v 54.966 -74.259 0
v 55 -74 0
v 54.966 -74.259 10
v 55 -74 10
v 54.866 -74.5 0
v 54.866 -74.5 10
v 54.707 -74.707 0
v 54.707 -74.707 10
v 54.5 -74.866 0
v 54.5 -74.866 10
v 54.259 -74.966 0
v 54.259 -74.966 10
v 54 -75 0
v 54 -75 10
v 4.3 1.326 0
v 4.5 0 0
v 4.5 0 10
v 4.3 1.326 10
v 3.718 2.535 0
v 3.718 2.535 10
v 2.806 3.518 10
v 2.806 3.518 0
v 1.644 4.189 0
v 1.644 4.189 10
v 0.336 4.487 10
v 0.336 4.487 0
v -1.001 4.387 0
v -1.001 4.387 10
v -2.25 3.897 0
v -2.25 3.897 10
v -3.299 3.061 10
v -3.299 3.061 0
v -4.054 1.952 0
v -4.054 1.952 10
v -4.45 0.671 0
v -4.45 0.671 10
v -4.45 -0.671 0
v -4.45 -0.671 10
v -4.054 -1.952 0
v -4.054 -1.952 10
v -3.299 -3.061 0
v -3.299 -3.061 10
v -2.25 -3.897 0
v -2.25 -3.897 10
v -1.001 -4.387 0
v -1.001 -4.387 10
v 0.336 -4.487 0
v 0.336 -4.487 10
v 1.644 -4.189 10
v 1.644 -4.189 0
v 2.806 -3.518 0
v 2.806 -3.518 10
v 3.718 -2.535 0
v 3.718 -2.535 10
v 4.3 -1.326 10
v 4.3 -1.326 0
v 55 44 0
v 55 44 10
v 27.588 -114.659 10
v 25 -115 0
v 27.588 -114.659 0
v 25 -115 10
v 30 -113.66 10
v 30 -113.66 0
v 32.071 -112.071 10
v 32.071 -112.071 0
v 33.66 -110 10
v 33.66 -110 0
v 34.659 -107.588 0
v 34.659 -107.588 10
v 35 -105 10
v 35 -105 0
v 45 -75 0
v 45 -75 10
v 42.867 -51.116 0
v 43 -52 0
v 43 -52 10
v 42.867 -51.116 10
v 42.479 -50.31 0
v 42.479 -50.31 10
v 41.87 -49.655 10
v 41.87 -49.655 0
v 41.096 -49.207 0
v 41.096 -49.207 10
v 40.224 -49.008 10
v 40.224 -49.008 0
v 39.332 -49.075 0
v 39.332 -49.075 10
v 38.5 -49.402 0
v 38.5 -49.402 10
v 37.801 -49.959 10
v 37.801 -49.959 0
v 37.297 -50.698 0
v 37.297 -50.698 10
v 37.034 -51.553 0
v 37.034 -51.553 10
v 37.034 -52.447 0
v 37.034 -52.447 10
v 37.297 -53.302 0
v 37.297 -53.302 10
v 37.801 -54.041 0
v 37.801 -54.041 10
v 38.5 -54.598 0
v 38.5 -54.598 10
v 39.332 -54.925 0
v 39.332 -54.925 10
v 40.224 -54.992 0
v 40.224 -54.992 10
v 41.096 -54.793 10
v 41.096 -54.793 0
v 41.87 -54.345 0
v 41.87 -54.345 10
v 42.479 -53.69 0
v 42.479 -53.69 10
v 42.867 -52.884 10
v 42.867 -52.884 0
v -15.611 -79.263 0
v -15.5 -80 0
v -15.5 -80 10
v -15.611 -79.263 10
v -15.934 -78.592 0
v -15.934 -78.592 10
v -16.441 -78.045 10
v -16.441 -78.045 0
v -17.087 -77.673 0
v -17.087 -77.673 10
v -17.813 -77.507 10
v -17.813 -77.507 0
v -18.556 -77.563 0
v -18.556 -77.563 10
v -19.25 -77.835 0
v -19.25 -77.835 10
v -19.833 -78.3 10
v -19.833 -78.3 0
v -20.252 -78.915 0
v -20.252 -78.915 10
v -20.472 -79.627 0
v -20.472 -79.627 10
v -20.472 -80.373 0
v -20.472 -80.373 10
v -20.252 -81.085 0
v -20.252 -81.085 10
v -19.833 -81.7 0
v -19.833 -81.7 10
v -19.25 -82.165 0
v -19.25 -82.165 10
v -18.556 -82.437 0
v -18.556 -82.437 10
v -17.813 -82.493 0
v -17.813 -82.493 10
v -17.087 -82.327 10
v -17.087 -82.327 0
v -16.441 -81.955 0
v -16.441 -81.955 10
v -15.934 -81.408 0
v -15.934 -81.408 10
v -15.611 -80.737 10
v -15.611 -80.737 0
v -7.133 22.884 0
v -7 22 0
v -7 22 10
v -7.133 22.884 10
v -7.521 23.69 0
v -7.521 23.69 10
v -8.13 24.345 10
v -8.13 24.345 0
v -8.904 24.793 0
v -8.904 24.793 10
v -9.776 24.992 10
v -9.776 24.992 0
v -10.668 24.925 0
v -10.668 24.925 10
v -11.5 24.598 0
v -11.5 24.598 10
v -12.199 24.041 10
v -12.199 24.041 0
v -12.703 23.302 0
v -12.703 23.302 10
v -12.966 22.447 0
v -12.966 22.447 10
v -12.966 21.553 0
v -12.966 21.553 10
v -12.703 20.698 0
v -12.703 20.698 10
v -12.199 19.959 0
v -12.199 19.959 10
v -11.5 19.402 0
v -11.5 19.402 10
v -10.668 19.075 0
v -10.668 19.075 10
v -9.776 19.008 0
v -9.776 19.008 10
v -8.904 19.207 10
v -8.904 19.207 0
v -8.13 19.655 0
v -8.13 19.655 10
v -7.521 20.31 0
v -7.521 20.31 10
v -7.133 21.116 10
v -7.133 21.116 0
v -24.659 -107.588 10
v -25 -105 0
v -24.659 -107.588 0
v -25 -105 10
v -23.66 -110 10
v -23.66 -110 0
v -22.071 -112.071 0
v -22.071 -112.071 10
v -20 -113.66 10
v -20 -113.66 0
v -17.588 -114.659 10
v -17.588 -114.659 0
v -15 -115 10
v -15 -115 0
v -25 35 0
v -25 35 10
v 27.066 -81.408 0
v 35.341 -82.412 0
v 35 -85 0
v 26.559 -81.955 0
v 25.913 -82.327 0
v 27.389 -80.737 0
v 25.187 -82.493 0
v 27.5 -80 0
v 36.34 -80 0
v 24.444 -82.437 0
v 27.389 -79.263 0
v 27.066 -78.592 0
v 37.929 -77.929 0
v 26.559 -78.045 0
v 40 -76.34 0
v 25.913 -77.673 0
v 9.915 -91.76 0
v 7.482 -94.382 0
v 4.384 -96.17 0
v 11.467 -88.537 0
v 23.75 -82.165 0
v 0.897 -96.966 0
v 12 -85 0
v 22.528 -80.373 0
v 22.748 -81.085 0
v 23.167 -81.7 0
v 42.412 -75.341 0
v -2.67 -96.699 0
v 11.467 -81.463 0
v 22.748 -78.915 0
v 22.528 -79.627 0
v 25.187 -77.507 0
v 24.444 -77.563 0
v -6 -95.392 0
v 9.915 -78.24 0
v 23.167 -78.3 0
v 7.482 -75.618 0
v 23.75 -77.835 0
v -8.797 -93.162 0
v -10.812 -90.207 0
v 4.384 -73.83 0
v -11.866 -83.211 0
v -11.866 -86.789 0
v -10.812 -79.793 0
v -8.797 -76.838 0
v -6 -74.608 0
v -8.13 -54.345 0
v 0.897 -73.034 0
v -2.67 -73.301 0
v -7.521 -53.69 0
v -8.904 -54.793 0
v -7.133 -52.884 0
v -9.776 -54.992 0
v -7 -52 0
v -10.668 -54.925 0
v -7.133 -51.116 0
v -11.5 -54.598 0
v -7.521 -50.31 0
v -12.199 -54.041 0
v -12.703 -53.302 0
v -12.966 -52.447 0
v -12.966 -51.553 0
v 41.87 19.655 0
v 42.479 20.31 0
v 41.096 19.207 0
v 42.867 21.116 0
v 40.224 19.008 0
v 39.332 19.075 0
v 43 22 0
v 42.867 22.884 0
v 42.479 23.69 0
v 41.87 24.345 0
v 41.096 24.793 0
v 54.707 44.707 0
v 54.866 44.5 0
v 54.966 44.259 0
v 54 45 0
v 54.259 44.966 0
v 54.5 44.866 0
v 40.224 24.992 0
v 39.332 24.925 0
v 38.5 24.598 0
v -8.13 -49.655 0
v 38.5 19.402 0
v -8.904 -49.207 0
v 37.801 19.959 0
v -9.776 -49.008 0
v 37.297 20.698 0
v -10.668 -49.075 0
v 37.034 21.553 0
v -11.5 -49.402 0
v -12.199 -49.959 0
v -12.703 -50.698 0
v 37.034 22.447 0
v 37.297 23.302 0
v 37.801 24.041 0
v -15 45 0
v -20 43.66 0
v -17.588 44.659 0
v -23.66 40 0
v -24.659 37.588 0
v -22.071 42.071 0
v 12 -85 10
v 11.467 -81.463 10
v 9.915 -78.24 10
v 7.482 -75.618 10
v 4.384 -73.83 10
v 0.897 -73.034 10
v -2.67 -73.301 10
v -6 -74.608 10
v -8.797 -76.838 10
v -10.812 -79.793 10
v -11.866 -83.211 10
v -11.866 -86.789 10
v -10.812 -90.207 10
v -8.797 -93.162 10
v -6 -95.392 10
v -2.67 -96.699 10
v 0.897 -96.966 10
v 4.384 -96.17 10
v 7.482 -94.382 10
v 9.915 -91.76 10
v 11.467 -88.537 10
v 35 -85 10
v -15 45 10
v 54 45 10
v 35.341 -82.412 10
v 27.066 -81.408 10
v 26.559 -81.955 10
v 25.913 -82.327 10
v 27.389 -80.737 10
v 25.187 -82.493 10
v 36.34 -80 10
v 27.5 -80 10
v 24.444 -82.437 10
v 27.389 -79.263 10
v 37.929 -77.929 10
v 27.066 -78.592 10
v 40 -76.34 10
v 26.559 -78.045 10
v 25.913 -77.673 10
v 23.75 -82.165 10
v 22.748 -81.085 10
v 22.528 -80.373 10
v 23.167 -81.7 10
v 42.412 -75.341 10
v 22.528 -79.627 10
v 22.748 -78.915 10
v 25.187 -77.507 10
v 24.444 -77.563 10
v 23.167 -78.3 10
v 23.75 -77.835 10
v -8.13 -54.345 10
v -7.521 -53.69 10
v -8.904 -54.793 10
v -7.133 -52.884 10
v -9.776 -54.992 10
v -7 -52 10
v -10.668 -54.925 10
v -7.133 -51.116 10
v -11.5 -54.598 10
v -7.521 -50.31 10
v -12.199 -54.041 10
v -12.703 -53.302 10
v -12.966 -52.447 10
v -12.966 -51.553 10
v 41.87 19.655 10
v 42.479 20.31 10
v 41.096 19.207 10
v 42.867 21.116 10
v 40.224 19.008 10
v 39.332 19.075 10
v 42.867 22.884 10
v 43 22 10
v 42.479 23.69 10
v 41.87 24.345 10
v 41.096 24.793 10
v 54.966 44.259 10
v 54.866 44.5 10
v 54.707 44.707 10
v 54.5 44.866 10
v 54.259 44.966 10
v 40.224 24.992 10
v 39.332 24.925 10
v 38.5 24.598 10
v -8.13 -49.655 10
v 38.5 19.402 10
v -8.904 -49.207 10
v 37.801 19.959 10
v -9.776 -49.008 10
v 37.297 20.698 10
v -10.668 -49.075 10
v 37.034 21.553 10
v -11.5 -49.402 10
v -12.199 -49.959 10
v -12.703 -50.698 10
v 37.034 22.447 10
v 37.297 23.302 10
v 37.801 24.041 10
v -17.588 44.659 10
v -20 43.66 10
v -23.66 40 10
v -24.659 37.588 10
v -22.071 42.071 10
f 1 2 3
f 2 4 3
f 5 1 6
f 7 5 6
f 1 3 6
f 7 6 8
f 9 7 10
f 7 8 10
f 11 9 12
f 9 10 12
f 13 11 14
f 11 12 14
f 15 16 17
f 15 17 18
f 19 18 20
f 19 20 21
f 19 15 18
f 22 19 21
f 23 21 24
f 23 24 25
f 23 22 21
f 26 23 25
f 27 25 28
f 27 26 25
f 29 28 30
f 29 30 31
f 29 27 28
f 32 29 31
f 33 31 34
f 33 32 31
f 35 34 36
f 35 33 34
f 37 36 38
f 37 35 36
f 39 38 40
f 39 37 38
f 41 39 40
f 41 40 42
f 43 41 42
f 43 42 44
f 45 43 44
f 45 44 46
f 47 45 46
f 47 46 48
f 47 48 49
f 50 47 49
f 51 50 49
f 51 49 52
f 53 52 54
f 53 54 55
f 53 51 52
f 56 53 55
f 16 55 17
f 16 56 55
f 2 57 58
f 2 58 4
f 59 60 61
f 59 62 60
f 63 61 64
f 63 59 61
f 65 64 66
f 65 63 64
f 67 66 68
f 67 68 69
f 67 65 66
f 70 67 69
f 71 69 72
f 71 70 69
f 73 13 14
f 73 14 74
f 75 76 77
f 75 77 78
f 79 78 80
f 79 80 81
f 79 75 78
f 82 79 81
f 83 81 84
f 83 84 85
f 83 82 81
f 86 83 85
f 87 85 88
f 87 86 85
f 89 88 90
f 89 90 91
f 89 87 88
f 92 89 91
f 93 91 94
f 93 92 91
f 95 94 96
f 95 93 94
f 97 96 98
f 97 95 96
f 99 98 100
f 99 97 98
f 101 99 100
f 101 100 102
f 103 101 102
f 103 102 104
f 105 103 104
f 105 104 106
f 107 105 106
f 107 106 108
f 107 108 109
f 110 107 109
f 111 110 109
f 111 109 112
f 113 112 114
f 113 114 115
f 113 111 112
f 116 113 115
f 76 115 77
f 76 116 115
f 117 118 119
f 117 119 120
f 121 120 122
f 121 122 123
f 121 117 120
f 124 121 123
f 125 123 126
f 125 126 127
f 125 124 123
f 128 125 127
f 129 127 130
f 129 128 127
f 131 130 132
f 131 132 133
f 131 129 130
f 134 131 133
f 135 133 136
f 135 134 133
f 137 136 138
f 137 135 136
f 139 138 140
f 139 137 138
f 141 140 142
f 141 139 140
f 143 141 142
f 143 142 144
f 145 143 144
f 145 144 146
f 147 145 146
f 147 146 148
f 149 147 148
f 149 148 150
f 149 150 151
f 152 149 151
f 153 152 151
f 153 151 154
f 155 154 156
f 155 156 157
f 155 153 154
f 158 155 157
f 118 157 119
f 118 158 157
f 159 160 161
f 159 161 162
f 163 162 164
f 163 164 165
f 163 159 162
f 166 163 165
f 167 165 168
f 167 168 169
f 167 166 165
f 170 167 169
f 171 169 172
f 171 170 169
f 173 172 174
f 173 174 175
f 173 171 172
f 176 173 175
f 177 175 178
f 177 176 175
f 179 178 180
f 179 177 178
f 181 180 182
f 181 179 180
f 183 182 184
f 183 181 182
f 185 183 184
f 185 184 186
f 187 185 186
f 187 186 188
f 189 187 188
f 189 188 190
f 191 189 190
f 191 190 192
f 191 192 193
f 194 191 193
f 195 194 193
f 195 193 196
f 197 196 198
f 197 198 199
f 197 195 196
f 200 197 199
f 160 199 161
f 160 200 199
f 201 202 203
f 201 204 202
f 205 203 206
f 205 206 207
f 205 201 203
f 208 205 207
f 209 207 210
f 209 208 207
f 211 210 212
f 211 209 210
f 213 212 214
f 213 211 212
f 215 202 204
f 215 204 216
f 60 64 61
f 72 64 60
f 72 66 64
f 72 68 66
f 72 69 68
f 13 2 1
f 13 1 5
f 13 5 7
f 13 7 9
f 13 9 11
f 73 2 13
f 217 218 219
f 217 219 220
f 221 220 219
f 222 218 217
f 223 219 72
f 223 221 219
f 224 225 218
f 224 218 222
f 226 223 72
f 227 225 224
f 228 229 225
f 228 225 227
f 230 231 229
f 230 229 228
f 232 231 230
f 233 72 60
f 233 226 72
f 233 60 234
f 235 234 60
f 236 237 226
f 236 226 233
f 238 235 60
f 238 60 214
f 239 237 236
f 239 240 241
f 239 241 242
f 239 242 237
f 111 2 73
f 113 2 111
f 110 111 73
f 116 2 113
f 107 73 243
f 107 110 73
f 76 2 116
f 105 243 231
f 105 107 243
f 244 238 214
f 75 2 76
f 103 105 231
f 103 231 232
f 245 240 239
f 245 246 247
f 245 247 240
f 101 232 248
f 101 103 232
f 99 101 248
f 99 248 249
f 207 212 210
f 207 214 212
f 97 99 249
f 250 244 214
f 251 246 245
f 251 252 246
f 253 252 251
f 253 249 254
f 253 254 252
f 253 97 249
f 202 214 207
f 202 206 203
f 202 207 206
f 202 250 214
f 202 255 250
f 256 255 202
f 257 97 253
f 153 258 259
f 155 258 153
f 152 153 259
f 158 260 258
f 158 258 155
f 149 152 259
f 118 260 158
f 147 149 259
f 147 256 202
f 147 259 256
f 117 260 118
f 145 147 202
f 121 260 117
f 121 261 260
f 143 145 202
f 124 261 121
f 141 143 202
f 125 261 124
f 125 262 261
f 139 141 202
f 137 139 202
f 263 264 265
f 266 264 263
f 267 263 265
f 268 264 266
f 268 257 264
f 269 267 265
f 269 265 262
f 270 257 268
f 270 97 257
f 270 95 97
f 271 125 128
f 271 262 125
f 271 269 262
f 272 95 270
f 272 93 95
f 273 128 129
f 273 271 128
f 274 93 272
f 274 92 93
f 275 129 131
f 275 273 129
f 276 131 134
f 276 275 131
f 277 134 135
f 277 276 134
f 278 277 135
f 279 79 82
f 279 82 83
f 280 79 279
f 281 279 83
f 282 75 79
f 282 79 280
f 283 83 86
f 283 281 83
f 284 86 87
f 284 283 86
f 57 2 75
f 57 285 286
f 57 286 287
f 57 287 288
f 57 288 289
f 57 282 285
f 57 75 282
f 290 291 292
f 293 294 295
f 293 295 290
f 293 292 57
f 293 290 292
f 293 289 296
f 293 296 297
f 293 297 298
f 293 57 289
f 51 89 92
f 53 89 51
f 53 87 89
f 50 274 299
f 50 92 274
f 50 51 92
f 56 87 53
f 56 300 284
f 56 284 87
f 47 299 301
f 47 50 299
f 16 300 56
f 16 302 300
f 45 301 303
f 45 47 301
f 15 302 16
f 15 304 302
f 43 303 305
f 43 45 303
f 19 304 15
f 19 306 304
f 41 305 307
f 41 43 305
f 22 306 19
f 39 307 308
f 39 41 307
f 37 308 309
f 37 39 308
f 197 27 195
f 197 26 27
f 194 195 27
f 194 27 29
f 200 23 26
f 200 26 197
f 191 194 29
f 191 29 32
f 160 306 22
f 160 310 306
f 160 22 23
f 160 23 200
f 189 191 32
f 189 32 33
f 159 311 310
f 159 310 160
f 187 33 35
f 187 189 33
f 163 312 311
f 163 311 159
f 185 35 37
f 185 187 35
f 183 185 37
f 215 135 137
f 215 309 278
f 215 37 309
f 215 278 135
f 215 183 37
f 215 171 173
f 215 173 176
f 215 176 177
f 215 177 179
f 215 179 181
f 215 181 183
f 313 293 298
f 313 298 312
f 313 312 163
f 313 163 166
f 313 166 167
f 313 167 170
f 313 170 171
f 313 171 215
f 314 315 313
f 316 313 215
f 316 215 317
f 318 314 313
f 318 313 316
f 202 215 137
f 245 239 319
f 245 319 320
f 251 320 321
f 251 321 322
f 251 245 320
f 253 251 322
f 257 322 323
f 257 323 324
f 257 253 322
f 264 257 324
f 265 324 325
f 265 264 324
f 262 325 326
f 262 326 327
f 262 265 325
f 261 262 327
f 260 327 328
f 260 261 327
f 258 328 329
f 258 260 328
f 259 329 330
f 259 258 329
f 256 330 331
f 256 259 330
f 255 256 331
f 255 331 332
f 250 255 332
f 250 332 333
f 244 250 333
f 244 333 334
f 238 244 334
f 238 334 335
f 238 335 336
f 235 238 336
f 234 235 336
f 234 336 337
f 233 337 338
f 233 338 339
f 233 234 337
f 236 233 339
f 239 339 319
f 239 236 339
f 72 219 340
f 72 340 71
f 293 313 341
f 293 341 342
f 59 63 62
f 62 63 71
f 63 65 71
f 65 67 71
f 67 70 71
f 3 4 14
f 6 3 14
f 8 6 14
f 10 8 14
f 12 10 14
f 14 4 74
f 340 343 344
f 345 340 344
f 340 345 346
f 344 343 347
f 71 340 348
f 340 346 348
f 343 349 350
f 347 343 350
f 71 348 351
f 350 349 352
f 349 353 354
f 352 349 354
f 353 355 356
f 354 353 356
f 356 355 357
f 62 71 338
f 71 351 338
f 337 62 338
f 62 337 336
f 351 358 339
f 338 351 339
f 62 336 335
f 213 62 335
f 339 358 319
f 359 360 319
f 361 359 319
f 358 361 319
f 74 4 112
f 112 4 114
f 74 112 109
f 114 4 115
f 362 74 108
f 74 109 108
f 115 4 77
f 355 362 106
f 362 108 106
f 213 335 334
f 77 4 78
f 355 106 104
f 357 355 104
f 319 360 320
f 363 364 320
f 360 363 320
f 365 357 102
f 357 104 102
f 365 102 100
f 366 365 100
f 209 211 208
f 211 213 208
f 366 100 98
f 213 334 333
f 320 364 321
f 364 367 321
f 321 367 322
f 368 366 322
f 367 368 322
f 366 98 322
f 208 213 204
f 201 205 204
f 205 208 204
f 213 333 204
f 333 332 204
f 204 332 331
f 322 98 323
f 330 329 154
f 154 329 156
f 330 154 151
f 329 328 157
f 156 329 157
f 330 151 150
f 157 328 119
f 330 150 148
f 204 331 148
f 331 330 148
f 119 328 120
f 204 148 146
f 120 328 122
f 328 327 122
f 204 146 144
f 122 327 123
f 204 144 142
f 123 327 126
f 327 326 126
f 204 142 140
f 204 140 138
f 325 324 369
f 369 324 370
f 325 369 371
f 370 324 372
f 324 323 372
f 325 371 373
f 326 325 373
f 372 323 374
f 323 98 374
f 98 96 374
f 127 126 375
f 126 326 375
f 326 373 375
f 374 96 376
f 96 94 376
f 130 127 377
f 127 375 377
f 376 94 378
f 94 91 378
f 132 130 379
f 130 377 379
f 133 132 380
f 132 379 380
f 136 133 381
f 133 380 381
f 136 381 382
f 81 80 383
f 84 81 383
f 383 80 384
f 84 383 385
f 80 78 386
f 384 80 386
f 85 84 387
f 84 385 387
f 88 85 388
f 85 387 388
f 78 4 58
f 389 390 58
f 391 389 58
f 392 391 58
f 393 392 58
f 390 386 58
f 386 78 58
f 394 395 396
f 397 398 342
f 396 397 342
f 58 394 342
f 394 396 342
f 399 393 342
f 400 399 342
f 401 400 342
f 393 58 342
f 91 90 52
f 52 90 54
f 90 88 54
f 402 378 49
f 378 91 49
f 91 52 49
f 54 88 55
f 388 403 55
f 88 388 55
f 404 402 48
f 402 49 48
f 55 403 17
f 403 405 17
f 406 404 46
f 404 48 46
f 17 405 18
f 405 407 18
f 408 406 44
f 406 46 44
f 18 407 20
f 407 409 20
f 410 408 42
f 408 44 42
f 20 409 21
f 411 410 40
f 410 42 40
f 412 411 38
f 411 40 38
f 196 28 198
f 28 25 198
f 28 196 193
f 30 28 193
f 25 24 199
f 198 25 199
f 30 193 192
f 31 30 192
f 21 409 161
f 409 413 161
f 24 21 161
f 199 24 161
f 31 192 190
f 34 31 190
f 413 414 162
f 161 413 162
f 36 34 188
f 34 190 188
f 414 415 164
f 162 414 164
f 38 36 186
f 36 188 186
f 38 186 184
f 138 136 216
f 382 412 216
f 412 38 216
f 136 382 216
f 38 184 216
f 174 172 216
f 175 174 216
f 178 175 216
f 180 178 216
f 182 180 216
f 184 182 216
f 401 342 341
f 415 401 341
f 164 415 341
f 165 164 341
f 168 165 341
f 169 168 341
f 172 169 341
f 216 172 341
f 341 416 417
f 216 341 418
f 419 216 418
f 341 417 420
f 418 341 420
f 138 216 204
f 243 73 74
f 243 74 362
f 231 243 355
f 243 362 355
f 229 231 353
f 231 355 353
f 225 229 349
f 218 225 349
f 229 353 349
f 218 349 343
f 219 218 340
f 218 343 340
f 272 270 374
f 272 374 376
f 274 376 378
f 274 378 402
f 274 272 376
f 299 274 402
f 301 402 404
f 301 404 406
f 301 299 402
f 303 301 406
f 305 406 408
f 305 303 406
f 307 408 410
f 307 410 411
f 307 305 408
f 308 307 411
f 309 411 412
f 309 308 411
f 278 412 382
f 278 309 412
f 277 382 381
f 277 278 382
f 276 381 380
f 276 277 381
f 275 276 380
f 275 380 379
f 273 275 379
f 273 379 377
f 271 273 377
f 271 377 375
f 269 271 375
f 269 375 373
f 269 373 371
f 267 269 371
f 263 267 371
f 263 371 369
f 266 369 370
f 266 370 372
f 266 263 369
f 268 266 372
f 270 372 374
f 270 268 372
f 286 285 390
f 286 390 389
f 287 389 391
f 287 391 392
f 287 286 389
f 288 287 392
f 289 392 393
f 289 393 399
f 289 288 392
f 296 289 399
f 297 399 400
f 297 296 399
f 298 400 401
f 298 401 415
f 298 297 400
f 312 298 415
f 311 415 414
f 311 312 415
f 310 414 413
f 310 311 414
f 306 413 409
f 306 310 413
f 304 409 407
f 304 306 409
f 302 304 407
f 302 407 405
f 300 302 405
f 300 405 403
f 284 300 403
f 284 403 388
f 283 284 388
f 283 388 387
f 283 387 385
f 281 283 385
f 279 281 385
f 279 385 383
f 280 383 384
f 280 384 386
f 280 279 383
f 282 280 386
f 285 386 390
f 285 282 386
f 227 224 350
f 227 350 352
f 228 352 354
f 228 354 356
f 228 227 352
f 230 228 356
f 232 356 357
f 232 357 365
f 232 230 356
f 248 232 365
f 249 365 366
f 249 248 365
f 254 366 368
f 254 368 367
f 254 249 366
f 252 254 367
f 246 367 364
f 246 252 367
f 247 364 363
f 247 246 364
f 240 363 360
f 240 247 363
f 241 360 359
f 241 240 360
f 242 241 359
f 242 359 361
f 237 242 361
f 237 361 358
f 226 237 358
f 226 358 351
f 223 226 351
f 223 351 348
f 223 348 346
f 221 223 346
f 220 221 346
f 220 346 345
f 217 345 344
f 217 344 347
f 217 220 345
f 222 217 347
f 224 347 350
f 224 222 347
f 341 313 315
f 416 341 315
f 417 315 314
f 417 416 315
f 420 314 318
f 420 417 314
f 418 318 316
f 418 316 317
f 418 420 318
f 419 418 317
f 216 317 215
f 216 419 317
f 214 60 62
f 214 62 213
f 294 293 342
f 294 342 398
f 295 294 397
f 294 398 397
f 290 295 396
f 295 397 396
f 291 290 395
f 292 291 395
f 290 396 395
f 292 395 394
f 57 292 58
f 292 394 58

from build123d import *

# Parameters (mm, degrees)
SKETCH_R    = 4.5
SKETCH_R_2  = 12
SKETCH_R_3  = 3
SKETCH_R_4  = 2.5
PAD_DEPTH   = 10
FILLET_R    = 10
FILLET001_R = 1


with BuildPart() as part:
    # Sketch → Pad (new body)
    with BuildSketch(Plane.XY):
        Polygon((-25, 45), (55, 45), (55, -75), (35, -75), (35, -115), (-25, -115), align=None)
        Circle(SKETCH_R, mode=Mode.SUBTRACT)
        with Locations((0, -85)):
            Circle(SKETCH_R_2, mode=Mode.SUBTRACT)
        with Locations((-10, -52)):
            Circle(SKETCH_R_3, mode=Mode.SUBTRACT)
        with Locations((40, -52)):
            Circle(SKETCH_R_3, mode=Mode.SUBTRACT)
        with Locations((40, 22)):
            Circle(SKETCH_R_3, mode=Mode.SUBTRACT)
        with Locations((-10, 22)):
            Circle(SKETCH_R_3, mode=Mode.SUBTRACT)
        with Locations((25, -80)):
            Circle(SKETCH_R_4, mode=Mode.SUBTRACT)
        with Locations((-18, -80)):
            Circle(SKETCH_R_4, mode=Mode.SUBTRACT)
    extrude(amount=PAD_DEPTH)

    # Fillet
    fillet_edges = [part.edges().sort_by_distance(p)[0] for p in [
        (35, -115, 5),
        (-25, -115, 5),
        (35, -75, 5),
        (-25, 45, 5),
    ]]
    fillet(fillet_edges, radius=FILLET_R)

    # Fillet001
    fillet001_edges = [part.edges().sort_by_distance(p)[0] for p in [
        (55, -75, 5),
        (55, 45, 5),
    ]]
    fillet(fillet001_edges, radius=FILLET001_R)


solid = part.part
